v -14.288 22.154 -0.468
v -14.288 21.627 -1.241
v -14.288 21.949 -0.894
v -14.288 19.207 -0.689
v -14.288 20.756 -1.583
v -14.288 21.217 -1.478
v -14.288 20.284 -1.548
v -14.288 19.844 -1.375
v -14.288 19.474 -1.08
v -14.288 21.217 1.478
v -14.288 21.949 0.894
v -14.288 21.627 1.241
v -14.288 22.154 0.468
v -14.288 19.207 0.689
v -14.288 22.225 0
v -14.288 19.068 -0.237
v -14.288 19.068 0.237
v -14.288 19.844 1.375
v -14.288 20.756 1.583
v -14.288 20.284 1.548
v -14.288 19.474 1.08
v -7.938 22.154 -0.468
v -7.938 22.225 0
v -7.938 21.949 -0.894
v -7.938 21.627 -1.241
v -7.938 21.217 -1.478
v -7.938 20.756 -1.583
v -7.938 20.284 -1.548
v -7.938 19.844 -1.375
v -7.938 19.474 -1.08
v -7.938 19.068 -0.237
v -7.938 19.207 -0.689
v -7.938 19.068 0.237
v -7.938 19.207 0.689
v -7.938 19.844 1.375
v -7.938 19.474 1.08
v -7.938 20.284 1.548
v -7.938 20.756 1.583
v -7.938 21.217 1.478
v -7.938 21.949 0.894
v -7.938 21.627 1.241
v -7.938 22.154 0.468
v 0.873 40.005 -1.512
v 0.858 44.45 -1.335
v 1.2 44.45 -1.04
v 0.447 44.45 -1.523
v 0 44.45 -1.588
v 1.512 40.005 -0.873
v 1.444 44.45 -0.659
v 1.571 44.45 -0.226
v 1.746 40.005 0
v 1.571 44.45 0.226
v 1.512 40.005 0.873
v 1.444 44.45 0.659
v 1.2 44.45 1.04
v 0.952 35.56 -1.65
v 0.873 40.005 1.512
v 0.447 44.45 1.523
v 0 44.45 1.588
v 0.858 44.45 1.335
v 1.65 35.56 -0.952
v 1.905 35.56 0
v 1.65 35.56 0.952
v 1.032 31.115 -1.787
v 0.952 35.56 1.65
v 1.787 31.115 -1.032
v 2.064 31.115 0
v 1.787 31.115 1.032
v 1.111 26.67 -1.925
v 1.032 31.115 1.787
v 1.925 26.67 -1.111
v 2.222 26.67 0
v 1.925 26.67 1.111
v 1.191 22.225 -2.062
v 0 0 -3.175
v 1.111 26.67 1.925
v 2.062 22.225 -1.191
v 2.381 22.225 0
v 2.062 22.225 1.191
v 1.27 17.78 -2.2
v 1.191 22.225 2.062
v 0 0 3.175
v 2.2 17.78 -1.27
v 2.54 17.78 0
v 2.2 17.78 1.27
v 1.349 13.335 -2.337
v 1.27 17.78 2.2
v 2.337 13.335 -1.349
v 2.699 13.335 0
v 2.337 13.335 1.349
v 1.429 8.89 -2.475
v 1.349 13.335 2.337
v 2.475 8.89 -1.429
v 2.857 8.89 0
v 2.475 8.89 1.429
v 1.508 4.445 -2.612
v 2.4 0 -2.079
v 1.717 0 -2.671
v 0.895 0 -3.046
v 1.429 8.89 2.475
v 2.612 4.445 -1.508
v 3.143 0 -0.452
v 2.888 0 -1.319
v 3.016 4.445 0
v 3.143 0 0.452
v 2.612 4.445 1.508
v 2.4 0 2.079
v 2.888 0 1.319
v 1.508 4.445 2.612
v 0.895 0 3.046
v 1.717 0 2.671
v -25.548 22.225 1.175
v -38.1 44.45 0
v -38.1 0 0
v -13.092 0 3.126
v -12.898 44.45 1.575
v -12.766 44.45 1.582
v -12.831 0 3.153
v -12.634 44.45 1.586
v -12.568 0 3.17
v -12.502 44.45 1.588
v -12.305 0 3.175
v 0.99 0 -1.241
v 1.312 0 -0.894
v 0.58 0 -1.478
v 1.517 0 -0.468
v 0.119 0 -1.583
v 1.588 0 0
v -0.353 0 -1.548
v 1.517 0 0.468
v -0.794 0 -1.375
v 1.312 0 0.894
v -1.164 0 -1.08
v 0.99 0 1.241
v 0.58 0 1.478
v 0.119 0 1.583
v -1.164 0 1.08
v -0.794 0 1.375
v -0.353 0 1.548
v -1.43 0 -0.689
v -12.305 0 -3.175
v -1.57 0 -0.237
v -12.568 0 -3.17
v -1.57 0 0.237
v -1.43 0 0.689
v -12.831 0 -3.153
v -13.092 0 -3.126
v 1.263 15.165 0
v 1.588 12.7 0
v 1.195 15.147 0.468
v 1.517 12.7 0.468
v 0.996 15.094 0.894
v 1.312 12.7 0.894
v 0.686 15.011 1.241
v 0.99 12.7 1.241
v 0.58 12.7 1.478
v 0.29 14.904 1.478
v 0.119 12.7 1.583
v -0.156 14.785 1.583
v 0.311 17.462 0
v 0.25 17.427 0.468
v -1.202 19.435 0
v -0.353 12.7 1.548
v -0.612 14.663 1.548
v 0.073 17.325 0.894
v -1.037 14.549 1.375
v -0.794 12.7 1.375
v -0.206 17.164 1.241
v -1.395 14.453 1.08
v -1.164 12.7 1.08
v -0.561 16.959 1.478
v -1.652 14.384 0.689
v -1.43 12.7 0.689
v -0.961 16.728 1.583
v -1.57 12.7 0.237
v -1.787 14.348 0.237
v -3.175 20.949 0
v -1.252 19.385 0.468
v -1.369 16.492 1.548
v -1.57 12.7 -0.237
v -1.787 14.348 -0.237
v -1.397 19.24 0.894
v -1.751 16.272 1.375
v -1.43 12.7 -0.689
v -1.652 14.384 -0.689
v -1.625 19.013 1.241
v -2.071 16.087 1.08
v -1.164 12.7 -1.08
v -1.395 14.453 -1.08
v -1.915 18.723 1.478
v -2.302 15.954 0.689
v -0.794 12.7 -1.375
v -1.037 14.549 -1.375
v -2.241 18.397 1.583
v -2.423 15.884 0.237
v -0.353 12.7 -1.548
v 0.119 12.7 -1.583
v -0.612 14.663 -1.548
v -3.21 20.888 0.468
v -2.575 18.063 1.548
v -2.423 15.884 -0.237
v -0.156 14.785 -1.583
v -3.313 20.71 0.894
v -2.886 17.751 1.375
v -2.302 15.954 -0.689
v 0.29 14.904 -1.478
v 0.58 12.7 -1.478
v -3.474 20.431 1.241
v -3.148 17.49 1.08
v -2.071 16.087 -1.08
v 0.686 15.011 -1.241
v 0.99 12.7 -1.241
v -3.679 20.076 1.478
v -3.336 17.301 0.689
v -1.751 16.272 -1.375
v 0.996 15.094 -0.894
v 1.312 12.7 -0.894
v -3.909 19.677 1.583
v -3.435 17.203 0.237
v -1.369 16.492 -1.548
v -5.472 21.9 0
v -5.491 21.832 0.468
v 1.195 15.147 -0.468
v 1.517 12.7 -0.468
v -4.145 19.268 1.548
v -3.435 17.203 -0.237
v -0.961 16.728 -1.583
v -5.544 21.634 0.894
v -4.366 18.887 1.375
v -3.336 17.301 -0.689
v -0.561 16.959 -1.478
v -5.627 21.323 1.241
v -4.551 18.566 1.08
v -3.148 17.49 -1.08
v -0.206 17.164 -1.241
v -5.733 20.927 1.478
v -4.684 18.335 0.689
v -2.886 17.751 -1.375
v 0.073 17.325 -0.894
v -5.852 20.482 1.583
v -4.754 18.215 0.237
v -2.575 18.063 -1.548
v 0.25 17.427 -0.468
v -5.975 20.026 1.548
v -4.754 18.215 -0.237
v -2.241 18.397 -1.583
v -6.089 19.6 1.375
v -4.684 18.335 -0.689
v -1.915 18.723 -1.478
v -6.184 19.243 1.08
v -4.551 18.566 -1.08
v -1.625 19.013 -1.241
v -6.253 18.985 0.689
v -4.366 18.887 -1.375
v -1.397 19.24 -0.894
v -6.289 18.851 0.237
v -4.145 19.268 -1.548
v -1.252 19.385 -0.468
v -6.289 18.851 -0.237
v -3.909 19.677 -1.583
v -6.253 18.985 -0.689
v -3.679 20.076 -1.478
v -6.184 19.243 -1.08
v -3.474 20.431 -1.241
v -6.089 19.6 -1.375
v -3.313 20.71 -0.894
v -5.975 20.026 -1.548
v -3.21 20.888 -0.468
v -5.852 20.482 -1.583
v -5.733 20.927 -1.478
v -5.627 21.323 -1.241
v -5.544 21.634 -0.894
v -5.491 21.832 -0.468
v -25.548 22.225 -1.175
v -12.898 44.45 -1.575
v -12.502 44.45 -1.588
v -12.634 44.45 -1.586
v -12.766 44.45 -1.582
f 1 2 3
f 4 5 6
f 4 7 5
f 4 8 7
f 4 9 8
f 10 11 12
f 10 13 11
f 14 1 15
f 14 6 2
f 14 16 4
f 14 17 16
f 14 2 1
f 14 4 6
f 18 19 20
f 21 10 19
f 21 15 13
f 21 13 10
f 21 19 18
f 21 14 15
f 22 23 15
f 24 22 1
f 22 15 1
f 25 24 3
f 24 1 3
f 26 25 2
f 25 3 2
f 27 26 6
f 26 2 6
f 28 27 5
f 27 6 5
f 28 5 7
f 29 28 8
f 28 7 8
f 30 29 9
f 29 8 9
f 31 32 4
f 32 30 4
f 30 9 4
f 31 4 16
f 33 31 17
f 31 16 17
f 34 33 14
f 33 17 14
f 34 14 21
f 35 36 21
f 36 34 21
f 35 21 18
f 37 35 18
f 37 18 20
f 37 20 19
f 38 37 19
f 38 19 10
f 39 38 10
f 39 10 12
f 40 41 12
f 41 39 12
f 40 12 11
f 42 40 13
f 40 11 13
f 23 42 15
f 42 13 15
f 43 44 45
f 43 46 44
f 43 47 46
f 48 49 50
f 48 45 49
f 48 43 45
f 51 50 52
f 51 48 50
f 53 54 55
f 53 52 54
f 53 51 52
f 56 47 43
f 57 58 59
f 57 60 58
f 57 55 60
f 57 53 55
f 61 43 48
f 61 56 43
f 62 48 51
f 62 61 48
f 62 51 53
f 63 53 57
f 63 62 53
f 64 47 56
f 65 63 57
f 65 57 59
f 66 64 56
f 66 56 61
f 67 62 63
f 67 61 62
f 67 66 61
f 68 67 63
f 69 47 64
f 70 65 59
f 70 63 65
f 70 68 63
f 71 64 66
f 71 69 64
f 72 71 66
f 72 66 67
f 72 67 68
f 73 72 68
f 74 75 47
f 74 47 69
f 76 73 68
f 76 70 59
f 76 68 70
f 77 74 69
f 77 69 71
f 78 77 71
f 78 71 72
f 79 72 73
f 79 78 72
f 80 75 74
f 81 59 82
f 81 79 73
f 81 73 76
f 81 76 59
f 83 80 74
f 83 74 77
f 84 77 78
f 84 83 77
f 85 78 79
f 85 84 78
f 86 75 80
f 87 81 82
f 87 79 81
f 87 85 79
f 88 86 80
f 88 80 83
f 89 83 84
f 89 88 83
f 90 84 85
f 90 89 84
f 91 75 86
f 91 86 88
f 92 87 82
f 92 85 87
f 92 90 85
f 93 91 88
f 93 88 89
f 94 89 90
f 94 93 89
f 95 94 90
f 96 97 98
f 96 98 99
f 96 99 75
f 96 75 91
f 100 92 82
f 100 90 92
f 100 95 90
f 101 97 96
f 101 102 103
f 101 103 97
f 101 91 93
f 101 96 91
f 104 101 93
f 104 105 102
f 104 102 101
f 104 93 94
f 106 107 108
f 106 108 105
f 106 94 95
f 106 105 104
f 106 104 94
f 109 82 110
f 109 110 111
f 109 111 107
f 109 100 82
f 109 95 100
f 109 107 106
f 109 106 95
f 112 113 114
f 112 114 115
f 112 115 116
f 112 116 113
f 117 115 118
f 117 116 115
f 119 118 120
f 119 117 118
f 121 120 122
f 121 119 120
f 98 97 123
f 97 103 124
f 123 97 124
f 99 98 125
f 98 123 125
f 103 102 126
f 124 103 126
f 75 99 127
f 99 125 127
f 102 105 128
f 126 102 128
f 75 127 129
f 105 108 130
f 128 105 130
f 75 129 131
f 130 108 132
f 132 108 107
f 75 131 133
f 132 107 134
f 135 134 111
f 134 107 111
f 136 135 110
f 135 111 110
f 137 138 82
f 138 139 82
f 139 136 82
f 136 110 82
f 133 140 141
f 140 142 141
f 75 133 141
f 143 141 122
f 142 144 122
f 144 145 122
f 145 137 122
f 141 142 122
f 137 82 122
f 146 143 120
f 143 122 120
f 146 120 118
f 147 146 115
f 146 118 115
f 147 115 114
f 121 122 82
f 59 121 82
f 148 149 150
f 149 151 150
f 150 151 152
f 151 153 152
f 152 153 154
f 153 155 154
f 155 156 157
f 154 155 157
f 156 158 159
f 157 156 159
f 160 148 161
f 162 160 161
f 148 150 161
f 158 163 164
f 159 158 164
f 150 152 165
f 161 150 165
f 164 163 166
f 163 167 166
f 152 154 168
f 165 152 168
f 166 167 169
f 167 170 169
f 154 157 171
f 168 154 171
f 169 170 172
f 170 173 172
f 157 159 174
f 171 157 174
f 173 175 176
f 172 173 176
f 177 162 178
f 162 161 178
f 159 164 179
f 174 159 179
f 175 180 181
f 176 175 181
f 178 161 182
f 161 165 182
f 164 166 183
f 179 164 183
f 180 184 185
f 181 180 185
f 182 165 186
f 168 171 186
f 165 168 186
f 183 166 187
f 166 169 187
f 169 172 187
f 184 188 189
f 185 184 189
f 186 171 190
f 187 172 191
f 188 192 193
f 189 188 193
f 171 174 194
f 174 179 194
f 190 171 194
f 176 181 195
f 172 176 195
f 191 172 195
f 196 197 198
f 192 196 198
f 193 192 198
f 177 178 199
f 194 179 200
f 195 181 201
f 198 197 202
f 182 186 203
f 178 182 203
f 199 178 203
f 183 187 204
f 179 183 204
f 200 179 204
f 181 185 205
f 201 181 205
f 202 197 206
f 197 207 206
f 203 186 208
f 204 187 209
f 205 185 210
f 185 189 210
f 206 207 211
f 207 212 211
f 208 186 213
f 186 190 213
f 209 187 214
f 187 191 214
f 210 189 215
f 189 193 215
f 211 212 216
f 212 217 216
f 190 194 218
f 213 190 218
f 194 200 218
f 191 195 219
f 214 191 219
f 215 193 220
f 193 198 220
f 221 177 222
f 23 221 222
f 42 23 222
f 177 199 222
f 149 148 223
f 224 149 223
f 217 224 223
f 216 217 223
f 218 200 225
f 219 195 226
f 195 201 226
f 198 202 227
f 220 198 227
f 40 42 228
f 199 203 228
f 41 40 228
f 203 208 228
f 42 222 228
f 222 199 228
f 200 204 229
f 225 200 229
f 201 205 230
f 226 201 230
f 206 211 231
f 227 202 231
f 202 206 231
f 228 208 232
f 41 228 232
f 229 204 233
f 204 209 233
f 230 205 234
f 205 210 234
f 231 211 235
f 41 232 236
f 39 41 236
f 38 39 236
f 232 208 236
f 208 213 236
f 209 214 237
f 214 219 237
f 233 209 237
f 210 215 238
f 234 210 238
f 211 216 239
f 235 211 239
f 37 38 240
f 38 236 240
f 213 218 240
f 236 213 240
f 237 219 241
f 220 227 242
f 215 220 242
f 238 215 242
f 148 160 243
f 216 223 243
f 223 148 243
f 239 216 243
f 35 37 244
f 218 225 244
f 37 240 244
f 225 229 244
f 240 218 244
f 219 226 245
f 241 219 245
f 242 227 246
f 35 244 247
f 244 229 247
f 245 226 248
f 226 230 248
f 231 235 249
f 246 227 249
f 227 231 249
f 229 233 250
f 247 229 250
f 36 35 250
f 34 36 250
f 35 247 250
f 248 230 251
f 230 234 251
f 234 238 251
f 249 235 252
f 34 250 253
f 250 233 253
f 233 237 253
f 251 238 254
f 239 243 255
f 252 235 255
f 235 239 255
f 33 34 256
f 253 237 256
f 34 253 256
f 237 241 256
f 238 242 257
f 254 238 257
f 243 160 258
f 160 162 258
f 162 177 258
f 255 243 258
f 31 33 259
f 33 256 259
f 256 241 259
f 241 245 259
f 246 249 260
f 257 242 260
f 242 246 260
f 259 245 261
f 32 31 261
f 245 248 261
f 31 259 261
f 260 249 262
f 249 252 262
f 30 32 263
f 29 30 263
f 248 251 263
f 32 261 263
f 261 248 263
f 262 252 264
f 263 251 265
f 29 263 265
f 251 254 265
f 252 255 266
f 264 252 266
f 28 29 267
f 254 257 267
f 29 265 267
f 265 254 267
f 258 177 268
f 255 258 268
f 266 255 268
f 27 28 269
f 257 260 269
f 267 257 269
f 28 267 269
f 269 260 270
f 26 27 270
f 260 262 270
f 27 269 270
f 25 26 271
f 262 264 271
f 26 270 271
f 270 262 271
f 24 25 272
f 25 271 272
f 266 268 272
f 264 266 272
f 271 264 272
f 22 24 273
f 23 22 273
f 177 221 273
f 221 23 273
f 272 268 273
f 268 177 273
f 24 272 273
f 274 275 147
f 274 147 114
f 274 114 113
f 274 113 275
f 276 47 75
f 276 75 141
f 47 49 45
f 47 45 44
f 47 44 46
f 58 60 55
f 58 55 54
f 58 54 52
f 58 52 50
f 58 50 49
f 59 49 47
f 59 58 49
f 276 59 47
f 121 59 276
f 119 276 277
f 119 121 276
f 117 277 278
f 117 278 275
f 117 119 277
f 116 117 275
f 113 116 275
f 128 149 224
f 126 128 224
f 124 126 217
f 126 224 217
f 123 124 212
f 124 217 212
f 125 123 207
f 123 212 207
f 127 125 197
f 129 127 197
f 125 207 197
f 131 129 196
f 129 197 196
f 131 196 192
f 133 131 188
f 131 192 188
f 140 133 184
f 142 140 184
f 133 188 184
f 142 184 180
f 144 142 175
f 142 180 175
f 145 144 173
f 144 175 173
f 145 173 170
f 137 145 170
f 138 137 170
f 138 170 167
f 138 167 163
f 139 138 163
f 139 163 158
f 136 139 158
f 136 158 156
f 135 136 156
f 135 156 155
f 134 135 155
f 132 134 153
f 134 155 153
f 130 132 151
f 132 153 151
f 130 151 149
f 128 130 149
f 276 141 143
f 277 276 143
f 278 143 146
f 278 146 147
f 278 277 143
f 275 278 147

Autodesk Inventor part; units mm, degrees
ref_plane "YZ Plane" through (0, 0, 0) normal (1, 0, 0) x (0, 1, 0)
ref_plane "XY Plane" through (0, 0, 0) normal (0, 0, 1) x (1, 0, 0)
sketch "Sketch2" plane through (0, 0, 0) normal (0, 1, 0) x (-1, 0, 0)
  circle A0 centre (0, 0) radius 3.175
  line L0 (0, 0) -> (38.1, 0)
  line L1 (0, 3.175) -> (12.3047, 3.175)
  line L2 (0, -3.175) -> (12.3047, -3.175)
  line L3 (13.0923, -3.126) -> (38.1, 0)
  line L4 (38.1, 0) -> (13.0923, 3.126)
  arc A1 (13.0923, 3.126) -> (12.3047, 3.175) centre (12.3047, -3.175) ccw
  arc A2 (12.3047, -3.175) -> (13.0923, -3.126) centre (12.3047, 3.175) ccw
  circle A3 centre (0, 0) radius 1.5875
  point P0 (12.7, 3.175)
  dimension "d5" = 6.35
  dimension "d6" = 38.1
  dimension "d7" = 12.7
  dimension "d8" = 6.35
  dimension "d9" = 6.35
  dimension "d12" = 3.175
ref_plane "Work Plane1" through (0, 44.45, 0) normal (0, 1, 0) x (-1, 0, 0)
sketch "Sketch3" plane through (0, 44.45, 0) normal (0, 1, 0) x (-1, 0, 0)
  circle A0 centre (0, 0) radius 1.5875
  line L0 (0, 1.5875) -> (12.5018, 1.5875)
  line L1 (0, -1.5875) -> (12.5018, -1.5875)
  line L2 (12.8979, -1.5751) -> (38.1, 0)
  line L3 (38.1, 0) -> (12.8979, 1.5751)
  arc A1 (12.8979, 1.5751) -> (12.5018, 1.5875) centre (12.5018, -4.7625) ccw
  arc A2 (12.5018, -1.5875) -> (12.8979, -1.5751) centre (12.5018, 4.7625) ccw
  point P0 (12.7, 1.5875)
  dimension "d14" = 3.175
  dimension "d15" = 12.7
  dimension "d16" = 6.35
  dimension "d17" = 6.35
loft "Loft1" add profiles "Sketch2", "Sketch3" contours A0 | L0 L3 A2 L2 A0 | A0 L1 A1 L4 L0 | A3 / all
sketch "Sketch4" plane through (0, 0, 0) normal (0, 0, 1) x (1, 0, 0)
  line L0 (-12.3047, 0) -> (0, 0) projected
  line L1 (0, 0) -> (0, 12.7)
  line L2 (0, 0) -> (0, 44.45) projected
  line L3 (0, 12.7) -> (-7.9375, 12.7)
  line L4 (-7.9375, 12.7) -> (-7.9375, 20.6375)
  arc A0 (0, 12.7) -> (-7.9375, 20.6375) centre (-7.9375, 12.7) ccw
  line L5 (-7.9375, 20.6375) -> (-14.2875, 20.6375)
  dimension "d22" = 12.7
  dimension "d23" = 7.9375
  dimension "d24" = 7.9375
  dimension "d25" = 6.35
sketch "Sketch5" plane through (-12.3047, 0, -3.175) normal (0, -1, 0) x (1, 0, 0)
  circle A0 centre (12.3047, 3.175) radius 1.5875
  dimension "d26" = 3.175
sweep "Sweep1" cut profiles "Sketch5" path "Sketch4" path curves L1 A0 L5
properties part number "GenericControlSurface"
